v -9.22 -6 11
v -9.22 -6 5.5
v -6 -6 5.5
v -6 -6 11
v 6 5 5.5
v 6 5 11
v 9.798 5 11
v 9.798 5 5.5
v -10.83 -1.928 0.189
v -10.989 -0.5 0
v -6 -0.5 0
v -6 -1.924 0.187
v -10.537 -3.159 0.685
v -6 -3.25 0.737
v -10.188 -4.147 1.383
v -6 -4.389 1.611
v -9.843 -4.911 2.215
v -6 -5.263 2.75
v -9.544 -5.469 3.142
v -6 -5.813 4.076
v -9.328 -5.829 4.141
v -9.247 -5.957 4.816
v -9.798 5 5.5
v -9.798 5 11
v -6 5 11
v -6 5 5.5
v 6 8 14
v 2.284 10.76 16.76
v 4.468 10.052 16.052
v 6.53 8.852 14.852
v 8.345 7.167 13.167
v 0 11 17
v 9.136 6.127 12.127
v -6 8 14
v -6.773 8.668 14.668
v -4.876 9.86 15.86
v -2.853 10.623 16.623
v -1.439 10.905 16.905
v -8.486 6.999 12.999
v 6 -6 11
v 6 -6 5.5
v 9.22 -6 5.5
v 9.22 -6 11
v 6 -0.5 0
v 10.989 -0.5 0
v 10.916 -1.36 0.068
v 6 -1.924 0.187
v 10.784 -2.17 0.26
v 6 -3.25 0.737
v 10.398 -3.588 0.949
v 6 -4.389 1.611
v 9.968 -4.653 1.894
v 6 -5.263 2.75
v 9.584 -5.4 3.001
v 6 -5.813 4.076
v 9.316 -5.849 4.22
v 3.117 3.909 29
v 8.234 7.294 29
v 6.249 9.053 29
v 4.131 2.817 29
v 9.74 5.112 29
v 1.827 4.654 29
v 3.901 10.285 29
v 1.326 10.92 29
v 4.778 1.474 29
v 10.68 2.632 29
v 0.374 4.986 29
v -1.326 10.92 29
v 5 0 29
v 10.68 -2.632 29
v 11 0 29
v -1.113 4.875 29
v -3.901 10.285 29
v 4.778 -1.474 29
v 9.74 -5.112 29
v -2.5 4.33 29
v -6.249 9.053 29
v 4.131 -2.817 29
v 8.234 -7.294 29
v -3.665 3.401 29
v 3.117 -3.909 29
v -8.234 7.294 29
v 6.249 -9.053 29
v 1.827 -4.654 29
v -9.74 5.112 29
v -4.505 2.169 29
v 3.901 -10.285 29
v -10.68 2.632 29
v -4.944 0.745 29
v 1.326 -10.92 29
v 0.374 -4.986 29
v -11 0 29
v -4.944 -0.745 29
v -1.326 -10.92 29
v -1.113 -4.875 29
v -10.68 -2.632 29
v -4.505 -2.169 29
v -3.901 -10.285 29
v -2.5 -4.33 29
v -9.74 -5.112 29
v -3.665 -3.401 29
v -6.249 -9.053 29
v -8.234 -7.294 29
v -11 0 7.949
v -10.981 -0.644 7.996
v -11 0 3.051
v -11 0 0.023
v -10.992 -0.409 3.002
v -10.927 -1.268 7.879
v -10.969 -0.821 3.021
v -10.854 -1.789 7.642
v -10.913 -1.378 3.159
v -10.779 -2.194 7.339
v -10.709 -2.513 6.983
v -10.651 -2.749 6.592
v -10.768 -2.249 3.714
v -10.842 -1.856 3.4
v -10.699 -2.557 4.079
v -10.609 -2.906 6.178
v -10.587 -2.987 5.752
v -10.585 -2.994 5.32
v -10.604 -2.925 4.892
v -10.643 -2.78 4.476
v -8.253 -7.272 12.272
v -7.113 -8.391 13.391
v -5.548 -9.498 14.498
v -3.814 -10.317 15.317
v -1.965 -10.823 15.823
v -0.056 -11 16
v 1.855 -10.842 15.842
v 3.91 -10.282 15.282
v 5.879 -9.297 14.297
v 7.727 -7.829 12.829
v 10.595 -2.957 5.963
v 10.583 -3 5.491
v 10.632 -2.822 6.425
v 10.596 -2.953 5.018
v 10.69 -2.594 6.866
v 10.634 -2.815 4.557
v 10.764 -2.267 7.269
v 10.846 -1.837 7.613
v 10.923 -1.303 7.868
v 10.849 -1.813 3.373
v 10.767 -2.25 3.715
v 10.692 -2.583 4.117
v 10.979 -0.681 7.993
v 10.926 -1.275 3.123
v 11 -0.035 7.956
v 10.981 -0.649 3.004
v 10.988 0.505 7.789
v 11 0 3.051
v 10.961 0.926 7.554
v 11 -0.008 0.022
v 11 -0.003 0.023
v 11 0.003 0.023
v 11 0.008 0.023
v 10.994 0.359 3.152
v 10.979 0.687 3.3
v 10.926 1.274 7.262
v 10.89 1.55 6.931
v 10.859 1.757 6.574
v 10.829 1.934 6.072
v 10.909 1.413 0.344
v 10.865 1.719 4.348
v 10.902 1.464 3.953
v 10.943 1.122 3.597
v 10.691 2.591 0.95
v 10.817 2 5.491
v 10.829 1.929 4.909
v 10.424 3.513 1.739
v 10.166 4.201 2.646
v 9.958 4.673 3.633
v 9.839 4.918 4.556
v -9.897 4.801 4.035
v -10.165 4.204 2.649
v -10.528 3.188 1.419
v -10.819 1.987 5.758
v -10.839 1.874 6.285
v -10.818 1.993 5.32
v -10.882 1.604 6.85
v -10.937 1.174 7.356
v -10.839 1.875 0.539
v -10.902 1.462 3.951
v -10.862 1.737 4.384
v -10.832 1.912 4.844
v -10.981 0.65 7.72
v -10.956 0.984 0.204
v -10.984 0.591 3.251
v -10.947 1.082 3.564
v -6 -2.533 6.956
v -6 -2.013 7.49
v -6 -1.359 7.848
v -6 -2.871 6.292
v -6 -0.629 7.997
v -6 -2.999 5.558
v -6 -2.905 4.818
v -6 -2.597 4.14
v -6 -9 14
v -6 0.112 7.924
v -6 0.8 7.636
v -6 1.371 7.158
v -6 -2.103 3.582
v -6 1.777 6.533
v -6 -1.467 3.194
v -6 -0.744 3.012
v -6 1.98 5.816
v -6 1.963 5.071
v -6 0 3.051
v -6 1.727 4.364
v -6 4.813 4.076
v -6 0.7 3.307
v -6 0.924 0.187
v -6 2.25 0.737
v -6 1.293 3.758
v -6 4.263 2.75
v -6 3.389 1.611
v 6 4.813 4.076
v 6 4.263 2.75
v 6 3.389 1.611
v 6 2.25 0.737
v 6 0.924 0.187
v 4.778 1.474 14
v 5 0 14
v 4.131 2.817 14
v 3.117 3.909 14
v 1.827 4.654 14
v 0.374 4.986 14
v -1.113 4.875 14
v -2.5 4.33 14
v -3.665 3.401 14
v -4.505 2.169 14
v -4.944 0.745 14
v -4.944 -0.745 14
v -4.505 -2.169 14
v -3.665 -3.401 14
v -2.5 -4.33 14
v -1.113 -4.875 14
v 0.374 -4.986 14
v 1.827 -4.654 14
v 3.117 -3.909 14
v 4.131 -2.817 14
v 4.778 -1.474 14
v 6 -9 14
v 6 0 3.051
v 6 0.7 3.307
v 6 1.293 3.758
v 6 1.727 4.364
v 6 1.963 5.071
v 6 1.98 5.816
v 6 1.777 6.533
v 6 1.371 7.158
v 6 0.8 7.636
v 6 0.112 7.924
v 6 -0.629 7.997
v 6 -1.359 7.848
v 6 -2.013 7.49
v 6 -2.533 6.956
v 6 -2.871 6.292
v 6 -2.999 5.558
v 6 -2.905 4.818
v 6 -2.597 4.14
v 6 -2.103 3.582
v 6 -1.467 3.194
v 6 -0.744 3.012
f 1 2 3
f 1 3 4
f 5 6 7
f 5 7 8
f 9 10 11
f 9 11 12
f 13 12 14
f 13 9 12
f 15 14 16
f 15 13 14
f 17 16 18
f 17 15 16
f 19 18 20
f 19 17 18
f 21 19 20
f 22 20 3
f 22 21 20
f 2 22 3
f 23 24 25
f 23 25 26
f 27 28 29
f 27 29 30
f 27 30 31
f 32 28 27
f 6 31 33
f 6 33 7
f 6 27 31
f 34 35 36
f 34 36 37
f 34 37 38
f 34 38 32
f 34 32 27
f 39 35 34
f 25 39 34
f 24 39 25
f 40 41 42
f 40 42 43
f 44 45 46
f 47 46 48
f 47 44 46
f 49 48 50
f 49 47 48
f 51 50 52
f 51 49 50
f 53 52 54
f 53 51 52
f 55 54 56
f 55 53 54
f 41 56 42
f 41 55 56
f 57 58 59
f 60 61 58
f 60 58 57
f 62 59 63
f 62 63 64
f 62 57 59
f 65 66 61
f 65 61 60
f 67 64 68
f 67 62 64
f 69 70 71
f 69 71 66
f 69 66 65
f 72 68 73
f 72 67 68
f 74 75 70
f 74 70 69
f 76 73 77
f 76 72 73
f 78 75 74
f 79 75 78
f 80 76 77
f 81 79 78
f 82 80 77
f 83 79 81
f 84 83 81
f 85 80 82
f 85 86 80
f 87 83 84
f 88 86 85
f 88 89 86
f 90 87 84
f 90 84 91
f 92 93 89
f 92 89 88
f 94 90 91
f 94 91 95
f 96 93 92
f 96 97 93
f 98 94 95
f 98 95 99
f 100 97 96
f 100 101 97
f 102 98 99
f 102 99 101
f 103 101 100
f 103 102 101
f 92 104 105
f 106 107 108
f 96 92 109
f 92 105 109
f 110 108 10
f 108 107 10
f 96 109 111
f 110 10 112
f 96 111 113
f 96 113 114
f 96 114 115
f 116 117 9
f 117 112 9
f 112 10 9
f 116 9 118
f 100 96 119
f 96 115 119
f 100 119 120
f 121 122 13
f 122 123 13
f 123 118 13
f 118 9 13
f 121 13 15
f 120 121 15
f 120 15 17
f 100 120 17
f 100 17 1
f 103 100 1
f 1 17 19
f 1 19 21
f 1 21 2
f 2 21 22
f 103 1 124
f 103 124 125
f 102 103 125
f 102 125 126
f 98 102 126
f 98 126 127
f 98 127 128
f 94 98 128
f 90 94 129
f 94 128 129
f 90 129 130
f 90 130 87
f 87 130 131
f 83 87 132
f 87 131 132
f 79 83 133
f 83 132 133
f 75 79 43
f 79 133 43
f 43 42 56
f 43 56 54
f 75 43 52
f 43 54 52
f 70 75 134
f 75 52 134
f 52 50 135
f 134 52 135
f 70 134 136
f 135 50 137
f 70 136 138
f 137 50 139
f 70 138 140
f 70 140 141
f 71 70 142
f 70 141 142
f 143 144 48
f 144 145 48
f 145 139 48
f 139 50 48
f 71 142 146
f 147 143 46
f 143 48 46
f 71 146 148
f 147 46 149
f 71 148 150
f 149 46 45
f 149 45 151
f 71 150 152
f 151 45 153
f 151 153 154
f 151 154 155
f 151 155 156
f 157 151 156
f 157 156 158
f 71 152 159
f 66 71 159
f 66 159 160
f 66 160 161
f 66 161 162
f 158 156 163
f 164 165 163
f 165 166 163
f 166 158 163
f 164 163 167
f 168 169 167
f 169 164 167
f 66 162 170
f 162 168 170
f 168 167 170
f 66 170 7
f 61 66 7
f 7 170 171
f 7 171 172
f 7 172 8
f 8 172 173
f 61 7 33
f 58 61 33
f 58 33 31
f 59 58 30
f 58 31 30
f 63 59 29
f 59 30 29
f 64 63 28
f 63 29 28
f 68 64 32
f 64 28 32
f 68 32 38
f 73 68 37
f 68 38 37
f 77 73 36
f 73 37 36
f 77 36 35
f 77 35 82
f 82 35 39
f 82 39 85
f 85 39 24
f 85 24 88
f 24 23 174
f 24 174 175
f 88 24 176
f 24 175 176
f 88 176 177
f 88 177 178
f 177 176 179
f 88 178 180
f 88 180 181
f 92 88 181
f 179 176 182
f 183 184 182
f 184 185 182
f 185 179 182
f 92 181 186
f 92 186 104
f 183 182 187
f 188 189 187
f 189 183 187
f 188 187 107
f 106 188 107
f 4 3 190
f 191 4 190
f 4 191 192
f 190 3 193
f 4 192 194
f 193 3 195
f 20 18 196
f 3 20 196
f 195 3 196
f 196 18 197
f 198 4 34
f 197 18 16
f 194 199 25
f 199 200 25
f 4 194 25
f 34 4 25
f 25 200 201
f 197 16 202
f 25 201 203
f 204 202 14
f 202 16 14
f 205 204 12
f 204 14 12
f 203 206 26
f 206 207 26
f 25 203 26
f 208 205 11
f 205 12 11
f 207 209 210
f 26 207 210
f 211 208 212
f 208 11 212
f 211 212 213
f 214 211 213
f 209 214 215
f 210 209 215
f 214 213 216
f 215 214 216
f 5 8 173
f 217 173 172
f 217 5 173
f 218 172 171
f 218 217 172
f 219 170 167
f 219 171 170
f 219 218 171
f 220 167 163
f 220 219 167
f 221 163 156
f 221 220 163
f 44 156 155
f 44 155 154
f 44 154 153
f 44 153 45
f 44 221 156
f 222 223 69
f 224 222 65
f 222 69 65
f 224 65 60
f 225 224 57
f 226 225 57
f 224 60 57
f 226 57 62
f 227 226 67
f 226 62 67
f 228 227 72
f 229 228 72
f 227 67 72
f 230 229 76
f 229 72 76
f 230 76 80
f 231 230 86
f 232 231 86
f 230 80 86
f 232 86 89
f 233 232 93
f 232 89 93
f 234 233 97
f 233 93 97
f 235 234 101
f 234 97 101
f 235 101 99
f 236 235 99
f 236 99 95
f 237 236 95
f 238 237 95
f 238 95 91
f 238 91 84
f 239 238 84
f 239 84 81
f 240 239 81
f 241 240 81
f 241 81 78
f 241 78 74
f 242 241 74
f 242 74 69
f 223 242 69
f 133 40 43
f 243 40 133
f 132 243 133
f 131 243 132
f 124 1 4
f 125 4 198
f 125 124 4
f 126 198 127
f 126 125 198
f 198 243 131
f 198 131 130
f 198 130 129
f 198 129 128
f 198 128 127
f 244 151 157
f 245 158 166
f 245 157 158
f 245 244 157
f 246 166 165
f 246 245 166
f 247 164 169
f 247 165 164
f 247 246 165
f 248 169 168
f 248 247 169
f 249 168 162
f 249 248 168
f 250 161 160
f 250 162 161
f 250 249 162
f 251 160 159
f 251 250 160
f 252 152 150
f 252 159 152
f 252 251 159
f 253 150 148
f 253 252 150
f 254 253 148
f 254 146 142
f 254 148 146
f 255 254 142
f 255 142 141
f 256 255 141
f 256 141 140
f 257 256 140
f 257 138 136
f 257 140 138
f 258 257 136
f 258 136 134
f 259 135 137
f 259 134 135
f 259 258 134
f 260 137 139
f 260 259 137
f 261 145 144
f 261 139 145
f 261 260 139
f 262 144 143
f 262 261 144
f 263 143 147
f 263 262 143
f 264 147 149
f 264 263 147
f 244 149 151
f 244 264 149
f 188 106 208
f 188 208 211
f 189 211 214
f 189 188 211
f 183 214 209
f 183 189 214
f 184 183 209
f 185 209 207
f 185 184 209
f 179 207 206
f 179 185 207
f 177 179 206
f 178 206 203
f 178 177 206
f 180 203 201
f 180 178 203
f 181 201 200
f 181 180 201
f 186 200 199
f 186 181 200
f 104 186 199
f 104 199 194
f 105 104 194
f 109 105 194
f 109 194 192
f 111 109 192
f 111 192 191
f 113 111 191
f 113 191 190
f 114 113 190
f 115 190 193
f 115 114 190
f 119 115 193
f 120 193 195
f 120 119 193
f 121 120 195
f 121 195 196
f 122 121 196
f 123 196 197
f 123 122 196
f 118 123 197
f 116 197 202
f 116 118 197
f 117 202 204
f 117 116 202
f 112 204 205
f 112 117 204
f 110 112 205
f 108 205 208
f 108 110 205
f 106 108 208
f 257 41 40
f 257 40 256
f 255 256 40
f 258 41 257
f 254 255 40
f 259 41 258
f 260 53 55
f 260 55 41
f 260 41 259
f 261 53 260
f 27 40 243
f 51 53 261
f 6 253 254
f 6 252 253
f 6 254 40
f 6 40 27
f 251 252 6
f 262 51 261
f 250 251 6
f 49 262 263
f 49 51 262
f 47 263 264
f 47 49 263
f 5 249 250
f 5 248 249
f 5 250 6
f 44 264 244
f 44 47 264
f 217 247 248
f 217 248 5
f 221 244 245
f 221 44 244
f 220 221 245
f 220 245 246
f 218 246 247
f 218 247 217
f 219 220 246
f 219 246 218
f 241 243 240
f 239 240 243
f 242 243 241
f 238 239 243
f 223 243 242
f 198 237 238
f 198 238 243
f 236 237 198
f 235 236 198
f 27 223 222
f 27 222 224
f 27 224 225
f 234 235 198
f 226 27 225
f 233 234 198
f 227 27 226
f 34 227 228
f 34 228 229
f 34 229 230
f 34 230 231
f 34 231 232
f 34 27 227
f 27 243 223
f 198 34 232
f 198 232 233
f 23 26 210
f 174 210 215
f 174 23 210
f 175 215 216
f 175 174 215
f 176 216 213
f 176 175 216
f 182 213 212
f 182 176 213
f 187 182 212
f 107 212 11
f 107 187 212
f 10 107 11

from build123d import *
from OCP.BRepAlgoAPI import BRepAlgoAPI_Cut
from OCP.TopTools import TopTools_ListOfShape

# Parameters (mm, degrees)
SKETCH_1_R               = 11
EXTRUDE_1_DEPTH          = 29
CUT_EXTRUDE_1_DEPTH      = 29
CUT_EXTRUDE_1_DEPTH_BACK = 29
SKETCH_3_W               = 12
SKETCH_3_H               = 23.957820674
CUT_EXTRUDE_2_DEPTH      = 14
FILLET_START             = -11
FILLET_1_DEPTH           = 21.999997277
SKETCH_4_R               = 5
CUT_EXTRUDE_3_DEPTH      = 17
CUT_EXTRUDE_4_DEPTH      = 17
CUT_EXTRUDE_4_DEPTH_BACK = 17
SKETCH_5_R               = 2.5


with BuildPart() as part:
    # 草图1 → 凸台-拉伸1 (new body)
    with BuildSketch(Plane.XY):
        with Locations(Location((0, 0, 0), (0, 0, 180))):
            Circle(SKETCH_1_R)
    extrude(amount=EXTRUDE_1_DEPTH)

    # 草图2 → 切除-拉伸1 (cut, two sides: drawn at the far end of the back side and taken through both)
    with BuildSketch(Plane(origin=(0, 0, 0), x_dir=(0, 0, -1), z_dir=(1, 0, 0)).offset(-CUT_EXTRUDE_1_DEPTH_BACK)):
        Polygon((0, 5), (0, 11), (-17, 11), (-11, 5), align=None)
        Polygon((-17, -12), (0, -12), (0, -6), (-11, -6), align=None)
    extrude(amount=CUT_EXTRUDE_1_DEPTH + CUT_EXTRUDE_1_DEPTH_BACK, mode=Mode.SUBTRACT)

    # 草图3 → 切除-拉伸2 (cut)
    with BuildSketch(Plane(origin=(0, 0, 0), x_dir=(-1, 0, 0), z_dir=(0, 0, -1))):
        Rectangle(SKETCH_3_W, SKETCH_3_H)
    extrude(amount=-CUT_EXTRUDE_2_DEPTH, mode=Mode.SUBTRACT)


with BuildPart() as fillet_1_tool:
    # 圆角1: read off the stored shape, not the designer's step
    # 圆角1 outline → 圆角1 (new body)
    with BuildSketch(Plane.YZ.offset(FILLET_START)):
        with BuildLine():
            Line((-6, 0), (-0.5, 0))
            ThreePointArc((-0.5, 0), (-4.389087297, 1.610912703), (-6, 5.5))
            Line((-6, 5.5), (-6, 0))
        make_face()
        with BuildLine():
            ThreePointArc((5, 5.5), (3.389087297, 1.610912703), (-0.5, 0))
            Line((-0.5, 0), (5, 0))
            Line((5, 0), (5, 5.5))
        make_face()
    extrude(amount=FILLET_1_DEPTH)


with BuildPart() as part_1:
    add(part.part)

    # 圆角1: cut by fillet_1_tool, with a tolerance
    fillet_1_stock = TopTools_ListOfShape()
    fillet_1_stock.Append(part_1.part.wrapped)
    fillet_1_tools = TopTools_ListOfShape()
    fillet_1_tools.Append(fillet_1_tool.part.wrapped)
    fillet_1_cut = BRepAlgoAPI_Cut()
    fillet_1_cut.SetArguments(fillet_1_stock)
    fillet_1_cut.SetTools(fillet_1_tools)
    fillet_1_cut.SetFuzzyValue(0.00001)
    fillet_1_cut.Build()
    add(Compound.cast(fillet_1_cut.Shape()).solids(), mode=Mode.REPLACE)

    # 草图4 → 切除-拉伸3 (cut)
    with BuildSketch(Plane.XY.offset(29)):
        Circle(SKETCH_4_R)
    extrude(amount=-CUT_EXTRUDE_3_DEPTH, mode=Mode.SUBTRACT)

    # 草图5 → 切除-拉伸4 (cut, two sides: drawn at the far end of the back side and taken through both)
    with BuildSketch(Plane(origin=(-6, 0, 0), x_dir=(0, 0, -1), z_dir=(1, 0, 0)).offset(-CUT_EXTRUDE_4_DEPTH_BACK)):
        with Locations(Location((-5.5, -0.5, 0), (0, 0, 11.536959033))):
            Circle(SKETCH_5_R)
    extrude(amount=CUT_EXTRUDE_4_DEPTH + CUT_EXTRUDE_4_DEPTH_BACK, mode=Mode.SUBTRACT)


solid = part_1.part
